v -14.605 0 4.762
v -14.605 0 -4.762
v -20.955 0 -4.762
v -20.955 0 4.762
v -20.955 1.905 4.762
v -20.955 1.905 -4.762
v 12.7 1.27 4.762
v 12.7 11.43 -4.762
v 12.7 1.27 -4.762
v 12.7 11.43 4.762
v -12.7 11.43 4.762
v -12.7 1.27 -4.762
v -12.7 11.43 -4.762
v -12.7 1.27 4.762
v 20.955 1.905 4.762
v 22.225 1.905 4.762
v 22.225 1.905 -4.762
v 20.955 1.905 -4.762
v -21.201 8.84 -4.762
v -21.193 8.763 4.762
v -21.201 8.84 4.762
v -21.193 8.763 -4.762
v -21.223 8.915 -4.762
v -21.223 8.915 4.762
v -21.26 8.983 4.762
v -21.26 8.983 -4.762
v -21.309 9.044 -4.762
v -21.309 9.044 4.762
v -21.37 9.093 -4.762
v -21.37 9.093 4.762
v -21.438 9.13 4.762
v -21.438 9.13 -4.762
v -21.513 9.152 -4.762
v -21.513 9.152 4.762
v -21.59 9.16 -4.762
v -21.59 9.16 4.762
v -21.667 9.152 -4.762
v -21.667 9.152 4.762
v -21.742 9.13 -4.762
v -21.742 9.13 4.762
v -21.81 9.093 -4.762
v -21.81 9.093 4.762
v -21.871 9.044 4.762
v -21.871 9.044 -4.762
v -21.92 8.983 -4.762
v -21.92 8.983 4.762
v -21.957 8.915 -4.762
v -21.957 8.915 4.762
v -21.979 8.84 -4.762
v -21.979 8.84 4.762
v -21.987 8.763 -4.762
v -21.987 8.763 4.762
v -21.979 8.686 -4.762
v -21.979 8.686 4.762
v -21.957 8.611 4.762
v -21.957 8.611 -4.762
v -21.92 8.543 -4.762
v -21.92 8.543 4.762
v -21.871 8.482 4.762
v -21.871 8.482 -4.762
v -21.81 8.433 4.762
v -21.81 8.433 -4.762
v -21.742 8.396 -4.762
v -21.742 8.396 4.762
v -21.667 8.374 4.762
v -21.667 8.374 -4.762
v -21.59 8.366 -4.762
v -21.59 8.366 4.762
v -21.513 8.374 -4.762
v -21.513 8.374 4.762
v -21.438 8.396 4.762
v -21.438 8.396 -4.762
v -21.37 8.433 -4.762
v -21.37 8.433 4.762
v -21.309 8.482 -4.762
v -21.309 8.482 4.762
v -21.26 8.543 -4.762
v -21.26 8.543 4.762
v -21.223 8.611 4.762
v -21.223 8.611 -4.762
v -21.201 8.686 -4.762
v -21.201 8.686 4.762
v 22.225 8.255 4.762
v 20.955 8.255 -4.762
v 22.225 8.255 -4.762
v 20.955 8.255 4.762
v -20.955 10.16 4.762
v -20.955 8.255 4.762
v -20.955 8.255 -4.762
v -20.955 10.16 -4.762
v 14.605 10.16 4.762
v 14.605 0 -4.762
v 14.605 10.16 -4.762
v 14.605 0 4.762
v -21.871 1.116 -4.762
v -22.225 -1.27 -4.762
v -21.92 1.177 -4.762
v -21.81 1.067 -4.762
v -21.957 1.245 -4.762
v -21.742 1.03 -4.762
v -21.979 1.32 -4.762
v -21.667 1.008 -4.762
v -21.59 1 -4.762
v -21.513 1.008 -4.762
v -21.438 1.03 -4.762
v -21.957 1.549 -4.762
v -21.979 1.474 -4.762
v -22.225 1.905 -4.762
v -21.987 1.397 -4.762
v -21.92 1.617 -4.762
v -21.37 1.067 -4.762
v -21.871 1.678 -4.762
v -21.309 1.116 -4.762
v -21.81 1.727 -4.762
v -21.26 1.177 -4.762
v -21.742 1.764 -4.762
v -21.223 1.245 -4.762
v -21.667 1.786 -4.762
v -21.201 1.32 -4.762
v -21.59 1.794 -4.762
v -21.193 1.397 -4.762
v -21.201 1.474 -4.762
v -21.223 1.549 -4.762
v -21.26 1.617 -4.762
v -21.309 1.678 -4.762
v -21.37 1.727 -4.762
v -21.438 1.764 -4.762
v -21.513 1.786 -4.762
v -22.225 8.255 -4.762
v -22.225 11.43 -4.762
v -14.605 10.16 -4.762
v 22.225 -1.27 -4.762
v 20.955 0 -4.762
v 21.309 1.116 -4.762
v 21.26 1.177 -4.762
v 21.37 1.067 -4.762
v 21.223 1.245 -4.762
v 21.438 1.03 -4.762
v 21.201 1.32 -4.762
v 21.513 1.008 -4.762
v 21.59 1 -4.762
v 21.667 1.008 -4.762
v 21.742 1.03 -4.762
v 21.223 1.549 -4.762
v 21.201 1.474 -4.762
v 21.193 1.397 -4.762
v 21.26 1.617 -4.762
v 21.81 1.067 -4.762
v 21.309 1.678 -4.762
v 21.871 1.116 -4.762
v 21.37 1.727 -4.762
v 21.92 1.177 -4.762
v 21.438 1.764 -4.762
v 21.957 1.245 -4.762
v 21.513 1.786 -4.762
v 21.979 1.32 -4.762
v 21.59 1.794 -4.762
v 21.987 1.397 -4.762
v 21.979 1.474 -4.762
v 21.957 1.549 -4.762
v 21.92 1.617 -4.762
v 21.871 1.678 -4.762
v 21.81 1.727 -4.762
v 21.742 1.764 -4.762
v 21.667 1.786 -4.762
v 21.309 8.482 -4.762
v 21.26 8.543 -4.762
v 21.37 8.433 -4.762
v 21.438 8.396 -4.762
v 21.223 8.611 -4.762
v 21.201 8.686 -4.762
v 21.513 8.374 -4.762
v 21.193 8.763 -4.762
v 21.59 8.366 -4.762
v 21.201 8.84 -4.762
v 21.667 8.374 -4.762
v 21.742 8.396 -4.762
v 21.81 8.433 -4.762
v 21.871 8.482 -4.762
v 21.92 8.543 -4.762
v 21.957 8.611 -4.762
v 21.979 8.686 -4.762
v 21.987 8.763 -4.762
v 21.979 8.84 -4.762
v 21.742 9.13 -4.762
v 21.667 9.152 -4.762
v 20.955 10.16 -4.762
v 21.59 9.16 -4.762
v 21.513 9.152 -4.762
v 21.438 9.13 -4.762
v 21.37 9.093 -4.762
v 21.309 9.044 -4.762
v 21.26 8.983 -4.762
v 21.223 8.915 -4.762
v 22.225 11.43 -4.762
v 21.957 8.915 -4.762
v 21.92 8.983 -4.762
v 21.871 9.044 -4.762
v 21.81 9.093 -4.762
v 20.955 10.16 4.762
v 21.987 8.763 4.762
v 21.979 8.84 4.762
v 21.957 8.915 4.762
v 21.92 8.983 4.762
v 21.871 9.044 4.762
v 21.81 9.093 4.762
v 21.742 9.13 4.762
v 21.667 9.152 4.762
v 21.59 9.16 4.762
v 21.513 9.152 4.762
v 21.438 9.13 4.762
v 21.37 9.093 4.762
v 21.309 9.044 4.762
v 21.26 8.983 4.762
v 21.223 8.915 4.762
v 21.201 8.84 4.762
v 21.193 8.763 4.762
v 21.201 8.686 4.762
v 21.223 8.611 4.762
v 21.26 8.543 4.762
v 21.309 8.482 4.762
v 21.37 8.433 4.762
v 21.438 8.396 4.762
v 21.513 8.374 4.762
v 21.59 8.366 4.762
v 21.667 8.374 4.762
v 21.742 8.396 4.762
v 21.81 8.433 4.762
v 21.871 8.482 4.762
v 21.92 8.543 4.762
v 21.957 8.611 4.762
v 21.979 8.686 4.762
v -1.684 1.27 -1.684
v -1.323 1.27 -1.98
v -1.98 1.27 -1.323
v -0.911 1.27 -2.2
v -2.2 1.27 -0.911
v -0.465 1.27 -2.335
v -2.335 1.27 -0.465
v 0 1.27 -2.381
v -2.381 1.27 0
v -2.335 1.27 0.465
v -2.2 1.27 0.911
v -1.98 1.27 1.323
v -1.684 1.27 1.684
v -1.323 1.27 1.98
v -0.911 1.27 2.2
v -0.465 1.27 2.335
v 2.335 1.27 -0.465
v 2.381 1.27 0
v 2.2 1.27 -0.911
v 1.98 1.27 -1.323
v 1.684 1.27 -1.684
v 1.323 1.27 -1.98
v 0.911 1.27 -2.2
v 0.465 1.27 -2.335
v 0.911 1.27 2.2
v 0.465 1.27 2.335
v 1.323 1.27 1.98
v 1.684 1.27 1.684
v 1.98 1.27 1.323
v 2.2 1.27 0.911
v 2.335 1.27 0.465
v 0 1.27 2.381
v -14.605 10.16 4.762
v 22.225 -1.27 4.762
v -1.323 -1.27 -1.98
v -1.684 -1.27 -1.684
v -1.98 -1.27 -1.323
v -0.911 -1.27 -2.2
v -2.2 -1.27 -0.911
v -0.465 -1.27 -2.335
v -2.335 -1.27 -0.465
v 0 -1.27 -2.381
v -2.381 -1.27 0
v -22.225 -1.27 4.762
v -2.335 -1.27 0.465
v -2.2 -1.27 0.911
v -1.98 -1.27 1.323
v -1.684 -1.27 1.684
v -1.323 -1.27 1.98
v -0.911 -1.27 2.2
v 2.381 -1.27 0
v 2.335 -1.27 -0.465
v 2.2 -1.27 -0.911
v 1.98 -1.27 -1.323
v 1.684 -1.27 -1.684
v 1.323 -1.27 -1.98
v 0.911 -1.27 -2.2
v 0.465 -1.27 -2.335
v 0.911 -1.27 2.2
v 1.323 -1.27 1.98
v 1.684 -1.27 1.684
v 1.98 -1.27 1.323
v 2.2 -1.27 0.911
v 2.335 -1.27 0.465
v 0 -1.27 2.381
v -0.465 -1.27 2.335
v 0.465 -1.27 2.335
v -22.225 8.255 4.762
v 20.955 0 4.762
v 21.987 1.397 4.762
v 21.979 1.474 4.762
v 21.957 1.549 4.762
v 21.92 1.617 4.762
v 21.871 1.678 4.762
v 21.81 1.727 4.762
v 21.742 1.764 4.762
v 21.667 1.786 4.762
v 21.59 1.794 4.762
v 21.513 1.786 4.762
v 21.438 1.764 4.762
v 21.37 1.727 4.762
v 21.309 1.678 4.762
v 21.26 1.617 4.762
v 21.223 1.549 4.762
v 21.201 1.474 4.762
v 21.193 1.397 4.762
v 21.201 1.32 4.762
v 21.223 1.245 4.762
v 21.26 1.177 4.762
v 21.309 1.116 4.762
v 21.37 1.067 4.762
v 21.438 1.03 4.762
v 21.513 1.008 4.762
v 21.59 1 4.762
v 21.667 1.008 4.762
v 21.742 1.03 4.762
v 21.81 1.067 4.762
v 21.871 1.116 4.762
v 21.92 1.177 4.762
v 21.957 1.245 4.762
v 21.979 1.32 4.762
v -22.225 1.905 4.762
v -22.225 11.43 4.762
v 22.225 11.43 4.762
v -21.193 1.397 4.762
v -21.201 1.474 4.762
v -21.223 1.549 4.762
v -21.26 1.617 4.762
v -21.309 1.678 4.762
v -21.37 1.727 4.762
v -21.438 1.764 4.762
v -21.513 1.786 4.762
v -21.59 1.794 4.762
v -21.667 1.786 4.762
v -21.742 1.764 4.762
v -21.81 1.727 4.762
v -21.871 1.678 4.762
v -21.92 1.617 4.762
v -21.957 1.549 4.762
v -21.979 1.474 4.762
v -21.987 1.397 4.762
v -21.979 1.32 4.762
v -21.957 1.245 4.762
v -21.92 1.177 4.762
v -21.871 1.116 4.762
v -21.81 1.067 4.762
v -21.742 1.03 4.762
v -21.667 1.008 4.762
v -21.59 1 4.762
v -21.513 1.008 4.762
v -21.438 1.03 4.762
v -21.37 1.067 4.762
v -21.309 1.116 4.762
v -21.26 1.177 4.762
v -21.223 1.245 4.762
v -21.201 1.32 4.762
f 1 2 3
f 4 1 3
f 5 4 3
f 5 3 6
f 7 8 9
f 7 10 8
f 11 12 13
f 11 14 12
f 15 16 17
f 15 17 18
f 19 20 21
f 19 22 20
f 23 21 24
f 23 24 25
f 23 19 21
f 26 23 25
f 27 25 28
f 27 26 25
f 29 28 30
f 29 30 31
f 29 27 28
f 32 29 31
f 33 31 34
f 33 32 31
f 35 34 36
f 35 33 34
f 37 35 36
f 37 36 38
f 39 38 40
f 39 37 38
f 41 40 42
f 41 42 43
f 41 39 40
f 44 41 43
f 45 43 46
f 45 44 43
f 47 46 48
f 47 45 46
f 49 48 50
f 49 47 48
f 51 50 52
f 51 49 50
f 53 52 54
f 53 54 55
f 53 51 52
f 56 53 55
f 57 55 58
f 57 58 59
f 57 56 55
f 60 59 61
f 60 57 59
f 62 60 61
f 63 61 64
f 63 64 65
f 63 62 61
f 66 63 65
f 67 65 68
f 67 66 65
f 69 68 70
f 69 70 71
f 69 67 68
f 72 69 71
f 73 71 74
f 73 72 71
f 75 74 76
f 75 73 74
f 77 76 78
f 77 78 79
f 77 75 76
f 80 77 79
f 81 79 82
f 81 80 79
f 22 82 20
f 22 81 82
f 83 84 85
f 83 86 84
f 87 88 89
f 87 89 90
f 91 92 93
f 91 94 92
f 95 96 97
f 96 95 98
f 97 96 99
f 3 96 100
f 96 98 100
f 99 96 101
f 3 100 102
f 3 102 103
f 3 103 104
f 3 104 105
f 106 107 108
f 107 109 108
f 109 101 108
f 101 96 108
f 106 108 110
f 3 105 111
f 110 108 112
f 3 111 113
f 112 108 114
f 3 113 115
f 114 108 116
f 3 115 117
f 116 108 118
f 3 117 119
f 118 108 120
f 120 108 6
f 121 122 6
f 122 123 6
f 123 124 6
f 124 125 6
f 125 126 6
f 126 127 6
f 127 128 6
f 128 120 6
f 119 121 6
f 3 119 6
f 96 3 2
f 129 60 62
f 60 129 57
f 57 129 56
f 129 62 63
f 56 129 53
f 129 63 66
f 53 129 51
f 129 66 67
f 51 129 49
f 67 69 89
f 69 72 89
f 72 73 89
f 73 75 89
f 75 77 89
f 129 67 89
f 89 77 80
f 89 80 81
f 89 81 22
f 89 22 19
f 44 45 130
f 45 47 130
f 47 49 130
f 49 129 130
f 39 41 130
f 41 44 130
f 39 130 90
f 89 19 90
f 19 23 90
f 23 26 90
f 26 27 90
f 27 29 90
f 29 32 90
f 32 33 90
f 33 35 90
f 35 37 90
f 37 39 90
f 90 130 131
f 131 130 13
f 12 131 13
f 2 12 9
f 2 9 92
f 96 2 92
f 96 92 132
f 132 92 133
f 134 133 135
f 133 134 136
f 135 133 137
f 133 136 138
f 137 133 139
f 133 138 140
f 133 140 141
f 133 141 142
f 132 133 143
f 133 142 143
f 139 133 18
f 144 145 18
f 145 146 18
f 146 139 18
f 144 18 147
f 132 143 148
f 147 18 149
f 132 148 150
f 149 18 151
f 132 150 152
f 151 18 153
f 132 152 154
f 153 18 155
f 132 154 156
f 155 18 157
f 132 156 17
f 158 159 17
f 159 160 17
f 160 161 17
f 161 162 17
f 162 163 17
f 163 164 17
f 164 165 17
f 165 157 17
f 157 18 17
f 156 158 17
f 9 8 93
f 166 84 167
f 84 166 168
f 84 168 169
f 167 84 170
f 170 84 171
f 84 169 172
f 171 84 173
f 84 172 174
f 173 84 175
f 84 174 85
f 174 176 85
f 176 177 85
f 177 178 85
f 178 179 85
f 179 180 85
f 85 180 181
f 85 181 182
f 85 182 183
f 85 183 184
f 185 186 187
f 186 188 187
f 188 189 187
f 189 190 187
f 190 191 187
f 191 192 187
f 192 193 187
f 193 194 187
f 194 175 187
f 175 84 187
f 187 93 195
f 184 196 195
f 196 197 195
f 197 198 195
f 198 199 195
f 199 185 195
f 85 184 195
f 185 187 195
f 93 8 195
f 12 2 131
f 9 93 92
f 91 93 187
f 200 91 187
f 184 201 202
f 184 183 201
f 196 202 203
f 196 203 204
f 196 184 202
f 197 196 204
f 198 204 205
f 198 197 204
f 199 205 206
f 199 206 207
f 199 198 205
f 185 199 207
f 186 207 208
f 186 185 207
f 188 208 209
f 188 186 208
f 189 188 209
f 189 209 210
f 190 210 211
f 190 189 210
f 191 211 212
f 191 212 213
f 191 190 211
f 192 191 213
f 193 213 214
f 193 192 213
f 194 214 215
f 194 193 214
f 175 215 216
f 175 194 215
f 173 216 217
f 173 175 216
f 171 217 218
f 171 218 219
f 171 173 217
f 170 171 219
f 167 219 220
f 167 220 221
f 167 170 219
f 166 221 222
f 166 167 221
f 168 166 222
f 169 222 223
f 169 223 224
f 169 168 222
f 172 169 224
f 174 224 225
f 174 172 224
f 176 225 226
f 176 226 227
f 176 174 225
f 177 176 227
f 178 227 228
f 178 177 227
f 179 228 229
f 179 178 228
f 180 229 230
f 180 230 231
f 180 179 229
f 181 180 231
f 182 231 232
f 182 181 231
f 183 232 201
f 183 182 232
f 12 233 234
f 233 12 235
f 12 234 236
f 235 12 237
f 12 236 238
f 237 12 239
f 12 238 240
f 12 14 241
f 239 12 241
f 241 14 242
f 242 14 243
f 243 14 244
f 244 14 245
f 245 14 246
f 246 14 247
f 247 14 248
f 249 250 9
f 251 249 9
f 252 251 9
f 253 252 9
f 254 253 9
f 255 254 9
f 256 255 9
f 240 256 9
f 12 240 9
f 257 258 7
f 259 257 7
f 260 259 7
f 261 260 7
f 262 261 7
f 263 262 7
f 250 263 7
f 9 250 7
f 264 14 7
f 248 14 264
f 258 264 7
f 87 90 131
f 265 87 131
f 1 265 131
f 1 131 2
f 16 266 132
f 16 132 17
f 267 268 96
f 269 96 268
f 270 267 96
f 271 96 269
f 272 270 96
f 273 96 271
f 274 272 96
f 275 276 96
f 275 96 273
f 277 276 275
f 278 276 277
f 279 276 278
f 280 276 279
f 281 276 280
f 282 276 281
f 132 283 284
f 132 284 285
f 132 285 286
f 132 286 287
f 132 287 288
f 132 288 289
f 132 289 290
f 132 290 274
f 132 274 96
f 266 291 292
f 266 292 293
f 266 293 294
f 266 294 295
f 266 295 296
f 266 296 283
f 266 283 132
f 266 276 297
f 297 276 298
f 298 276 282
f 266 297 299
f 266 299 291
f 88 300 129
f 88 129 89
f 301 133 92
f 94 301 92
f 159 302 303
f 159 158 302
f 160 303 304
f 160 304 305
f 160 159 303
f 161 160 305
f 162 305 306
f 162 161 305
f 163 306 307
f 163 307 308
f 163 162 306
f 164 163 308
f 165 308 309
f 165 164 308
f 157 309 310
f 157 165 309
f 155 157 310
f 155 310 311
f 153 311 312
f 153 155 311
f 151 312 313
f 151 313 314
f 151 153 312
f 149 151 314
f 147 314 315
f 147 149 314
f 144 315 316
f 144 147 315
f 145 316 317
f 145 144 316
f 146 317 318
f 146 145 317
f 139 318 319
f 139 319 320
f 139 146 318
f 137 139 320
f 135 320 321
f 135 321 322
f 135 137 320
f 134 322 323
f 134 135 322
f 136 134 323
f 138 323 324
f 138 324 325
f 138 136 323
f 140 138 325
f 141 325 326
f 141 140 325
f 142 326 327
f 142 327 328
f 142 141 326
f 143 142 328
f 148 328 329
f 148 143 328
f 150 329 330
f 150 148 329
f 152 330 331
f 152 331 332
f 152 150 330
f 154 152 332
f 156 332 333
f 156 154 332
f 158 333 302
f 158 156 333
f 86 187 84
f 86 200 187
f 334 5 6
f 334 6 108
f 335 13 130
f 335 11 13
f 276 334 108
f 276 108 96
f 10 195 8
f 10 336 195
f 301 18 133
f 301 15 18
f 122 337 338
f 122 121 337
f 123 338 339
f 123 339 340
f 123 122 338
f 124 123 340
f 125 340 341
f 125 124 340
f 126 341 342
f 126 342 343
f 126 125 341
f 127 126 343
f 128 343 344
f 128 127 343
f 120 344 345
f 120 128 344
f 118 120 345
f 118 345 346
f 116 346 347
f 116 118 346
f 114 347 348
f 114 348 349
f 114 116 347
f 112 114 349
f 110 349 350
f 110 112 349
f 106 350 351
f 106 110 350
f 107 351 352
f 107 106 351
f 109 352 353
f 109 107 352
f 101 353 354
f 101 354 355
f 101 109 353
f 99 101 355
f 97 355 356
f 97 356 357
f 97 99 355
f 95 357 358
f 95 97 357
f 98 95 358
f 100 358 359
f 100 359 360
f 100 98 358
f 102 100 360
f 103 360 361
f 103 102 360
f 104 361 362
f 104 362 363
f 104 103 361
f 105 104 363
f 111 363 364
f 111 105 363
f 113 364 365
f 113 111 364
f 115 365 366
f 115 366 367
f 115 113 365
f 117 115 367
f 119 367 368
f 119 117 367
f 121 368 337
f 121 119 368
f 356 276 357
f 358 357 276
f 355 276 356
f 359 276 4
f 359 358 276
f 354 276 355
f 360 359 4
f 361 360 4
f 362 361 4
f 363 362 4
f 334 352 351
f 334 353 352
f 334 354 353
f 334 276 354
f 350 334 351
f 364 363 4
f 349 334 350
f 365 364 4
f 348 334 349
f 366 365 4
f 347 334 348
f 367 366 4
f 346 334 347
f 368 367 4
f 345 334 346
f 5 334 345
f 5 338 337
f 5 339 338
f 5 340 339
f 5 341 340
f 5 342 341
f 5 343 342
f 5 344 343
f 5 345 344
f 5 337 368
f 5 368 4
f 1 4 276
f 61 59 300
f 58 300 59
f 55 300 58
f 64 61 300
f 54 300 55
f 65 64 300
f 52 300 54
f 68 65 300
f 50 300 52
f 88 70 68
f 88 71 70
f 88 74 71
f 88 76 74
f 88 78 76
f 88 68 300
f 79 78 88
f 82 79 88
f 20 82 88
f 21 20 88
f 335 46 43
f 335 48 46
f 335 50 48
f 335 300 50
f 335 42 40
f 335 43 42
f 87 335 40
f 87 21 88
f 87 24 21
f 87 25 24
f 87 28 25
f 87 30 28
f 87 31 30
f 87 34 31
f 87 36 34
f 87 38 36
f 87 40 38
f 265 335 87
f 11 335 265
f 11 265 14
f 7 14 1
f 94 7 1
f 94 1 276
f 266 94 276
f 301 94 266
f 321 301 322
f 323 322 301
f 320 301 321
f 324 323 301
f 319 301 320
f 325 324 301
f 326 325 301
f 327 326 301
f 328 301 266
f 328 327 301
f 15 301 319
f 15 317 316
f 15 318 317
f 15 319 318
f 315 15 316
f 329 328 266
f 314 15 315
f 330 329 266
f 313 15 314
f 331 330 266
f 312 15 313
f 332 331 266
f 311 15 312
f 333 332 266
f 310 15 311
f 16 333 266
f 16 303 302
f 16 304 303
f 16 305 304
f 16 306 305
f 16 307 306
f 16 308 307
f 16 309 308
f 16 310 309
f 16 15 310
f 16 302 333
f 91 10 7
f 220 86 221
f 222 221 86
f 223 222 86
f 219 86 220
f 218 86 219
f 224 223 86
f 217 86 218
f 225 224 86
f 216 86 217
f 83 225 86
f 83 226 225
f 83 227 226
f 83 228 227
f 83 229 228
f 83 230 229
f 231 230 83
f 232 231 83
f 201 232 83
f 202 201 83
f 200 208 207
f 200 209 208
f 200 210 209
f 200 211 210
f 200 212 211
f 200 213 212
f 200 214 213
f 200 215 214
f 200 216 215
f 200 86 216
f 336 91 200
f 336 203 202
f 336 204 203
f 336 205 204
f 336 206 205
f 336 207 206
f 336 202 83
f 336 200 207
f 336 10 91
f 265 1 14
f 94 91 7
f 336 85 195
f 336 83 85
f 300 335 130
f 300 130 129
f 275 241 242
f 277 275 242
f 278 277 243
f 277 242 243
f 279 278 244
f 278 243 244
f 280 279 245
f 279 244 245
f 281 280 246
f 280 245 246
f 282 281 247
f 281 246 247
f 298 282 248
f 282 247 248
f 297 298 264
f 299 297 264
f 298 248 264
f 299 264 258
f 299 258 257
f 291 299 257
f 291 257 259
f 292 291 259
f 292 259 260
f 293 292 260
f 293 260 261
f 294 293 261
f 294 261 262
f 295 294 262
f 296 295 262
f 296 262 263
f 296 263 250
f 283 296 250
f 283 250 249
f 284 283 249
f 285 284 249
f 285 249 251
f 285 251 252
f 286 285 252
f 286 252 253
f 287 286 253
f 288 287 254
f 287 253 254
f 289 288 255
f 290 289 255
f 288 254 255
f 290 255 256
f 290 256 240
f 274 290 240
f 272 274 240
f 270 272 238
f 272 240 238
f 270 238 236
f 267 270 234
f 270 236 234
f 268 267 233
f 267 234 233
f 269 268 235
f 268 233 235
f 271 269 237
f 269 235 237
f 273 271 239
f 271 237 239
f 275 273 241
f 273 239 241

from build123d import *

# Parameters (mm, degrees)
F0_R     = 0.396875
F0_W     = 25.4
F0_H     = 2.54
F1_DEPTH = 4.7625
F2_R     = 2.38125
F3_DEPTH = 5.969


# Not quite as in the source:
# - a length typed as a fraction of an inch, garbled in the dataset ("3 / 203.2 mm" for 3/8 in), is restored
# - a feature names something its author has since deleted; it is built from what else it names


with BuildPart() as f1:
    # F0 (on Top) → F1 (new body, symmetric)
    with BuildSketch(Plane.XY):
        Polygon((-12.7, 11.43), (-22.225, 11.43), (-22.225, 8.255), (-20.955, 8.255), (-20.955, 10.16), (-14.605, 10.16), (-14.605, 0), (-20.955, 0), (-20.955, 1.905), (-22.225, 1.905), (-22.225, -1.27), (-12.7, -1.27), (-12.7, 1.27), align=None)
        with Locations((-21.59, 1.397)):
            Circle(F0_R, mode=Mode.SUBTRACT)
        with Locations((-21.59, 8.763)):
            Circle(F0_R, mode=Mode.SUBTRACT)
        Rectangle(F0_W, F0_H)
        Polygon((12.7, 11.43), (12.7, 1.27), (12.7, -1.27), (22.225, -1.27), (22.225, 1.905), (20.955, 1.905), (20.955, 0), (14.605, 0), (14.605, 10.16), (20.955, 10.16), (20.955, 8.255), (22.225, 8.255), (22.225, 11.43), align=None)
        with Locations((21.59, 1.397)):
            Circle(F0_R, mode=Mode.SUBTRACT)
        with Locations((21.59, 8.763)):
            Circle(F0_R, mode=Mode.SUBTRACT)
    extrude(amount=F1_DEPTH, both=True)

    # F2 (on face) → F3 (cut)
    with BuildSketch(Plane(origin=(0, 1.27, 0), x_dir=(-1, 0, 0), z_dir=(0, 1, 0))):
        Circle(F2_R)
    extrude(amount=-F3_DEPTH, mode=Mode.SUBTRACT)


solid = f1.part
